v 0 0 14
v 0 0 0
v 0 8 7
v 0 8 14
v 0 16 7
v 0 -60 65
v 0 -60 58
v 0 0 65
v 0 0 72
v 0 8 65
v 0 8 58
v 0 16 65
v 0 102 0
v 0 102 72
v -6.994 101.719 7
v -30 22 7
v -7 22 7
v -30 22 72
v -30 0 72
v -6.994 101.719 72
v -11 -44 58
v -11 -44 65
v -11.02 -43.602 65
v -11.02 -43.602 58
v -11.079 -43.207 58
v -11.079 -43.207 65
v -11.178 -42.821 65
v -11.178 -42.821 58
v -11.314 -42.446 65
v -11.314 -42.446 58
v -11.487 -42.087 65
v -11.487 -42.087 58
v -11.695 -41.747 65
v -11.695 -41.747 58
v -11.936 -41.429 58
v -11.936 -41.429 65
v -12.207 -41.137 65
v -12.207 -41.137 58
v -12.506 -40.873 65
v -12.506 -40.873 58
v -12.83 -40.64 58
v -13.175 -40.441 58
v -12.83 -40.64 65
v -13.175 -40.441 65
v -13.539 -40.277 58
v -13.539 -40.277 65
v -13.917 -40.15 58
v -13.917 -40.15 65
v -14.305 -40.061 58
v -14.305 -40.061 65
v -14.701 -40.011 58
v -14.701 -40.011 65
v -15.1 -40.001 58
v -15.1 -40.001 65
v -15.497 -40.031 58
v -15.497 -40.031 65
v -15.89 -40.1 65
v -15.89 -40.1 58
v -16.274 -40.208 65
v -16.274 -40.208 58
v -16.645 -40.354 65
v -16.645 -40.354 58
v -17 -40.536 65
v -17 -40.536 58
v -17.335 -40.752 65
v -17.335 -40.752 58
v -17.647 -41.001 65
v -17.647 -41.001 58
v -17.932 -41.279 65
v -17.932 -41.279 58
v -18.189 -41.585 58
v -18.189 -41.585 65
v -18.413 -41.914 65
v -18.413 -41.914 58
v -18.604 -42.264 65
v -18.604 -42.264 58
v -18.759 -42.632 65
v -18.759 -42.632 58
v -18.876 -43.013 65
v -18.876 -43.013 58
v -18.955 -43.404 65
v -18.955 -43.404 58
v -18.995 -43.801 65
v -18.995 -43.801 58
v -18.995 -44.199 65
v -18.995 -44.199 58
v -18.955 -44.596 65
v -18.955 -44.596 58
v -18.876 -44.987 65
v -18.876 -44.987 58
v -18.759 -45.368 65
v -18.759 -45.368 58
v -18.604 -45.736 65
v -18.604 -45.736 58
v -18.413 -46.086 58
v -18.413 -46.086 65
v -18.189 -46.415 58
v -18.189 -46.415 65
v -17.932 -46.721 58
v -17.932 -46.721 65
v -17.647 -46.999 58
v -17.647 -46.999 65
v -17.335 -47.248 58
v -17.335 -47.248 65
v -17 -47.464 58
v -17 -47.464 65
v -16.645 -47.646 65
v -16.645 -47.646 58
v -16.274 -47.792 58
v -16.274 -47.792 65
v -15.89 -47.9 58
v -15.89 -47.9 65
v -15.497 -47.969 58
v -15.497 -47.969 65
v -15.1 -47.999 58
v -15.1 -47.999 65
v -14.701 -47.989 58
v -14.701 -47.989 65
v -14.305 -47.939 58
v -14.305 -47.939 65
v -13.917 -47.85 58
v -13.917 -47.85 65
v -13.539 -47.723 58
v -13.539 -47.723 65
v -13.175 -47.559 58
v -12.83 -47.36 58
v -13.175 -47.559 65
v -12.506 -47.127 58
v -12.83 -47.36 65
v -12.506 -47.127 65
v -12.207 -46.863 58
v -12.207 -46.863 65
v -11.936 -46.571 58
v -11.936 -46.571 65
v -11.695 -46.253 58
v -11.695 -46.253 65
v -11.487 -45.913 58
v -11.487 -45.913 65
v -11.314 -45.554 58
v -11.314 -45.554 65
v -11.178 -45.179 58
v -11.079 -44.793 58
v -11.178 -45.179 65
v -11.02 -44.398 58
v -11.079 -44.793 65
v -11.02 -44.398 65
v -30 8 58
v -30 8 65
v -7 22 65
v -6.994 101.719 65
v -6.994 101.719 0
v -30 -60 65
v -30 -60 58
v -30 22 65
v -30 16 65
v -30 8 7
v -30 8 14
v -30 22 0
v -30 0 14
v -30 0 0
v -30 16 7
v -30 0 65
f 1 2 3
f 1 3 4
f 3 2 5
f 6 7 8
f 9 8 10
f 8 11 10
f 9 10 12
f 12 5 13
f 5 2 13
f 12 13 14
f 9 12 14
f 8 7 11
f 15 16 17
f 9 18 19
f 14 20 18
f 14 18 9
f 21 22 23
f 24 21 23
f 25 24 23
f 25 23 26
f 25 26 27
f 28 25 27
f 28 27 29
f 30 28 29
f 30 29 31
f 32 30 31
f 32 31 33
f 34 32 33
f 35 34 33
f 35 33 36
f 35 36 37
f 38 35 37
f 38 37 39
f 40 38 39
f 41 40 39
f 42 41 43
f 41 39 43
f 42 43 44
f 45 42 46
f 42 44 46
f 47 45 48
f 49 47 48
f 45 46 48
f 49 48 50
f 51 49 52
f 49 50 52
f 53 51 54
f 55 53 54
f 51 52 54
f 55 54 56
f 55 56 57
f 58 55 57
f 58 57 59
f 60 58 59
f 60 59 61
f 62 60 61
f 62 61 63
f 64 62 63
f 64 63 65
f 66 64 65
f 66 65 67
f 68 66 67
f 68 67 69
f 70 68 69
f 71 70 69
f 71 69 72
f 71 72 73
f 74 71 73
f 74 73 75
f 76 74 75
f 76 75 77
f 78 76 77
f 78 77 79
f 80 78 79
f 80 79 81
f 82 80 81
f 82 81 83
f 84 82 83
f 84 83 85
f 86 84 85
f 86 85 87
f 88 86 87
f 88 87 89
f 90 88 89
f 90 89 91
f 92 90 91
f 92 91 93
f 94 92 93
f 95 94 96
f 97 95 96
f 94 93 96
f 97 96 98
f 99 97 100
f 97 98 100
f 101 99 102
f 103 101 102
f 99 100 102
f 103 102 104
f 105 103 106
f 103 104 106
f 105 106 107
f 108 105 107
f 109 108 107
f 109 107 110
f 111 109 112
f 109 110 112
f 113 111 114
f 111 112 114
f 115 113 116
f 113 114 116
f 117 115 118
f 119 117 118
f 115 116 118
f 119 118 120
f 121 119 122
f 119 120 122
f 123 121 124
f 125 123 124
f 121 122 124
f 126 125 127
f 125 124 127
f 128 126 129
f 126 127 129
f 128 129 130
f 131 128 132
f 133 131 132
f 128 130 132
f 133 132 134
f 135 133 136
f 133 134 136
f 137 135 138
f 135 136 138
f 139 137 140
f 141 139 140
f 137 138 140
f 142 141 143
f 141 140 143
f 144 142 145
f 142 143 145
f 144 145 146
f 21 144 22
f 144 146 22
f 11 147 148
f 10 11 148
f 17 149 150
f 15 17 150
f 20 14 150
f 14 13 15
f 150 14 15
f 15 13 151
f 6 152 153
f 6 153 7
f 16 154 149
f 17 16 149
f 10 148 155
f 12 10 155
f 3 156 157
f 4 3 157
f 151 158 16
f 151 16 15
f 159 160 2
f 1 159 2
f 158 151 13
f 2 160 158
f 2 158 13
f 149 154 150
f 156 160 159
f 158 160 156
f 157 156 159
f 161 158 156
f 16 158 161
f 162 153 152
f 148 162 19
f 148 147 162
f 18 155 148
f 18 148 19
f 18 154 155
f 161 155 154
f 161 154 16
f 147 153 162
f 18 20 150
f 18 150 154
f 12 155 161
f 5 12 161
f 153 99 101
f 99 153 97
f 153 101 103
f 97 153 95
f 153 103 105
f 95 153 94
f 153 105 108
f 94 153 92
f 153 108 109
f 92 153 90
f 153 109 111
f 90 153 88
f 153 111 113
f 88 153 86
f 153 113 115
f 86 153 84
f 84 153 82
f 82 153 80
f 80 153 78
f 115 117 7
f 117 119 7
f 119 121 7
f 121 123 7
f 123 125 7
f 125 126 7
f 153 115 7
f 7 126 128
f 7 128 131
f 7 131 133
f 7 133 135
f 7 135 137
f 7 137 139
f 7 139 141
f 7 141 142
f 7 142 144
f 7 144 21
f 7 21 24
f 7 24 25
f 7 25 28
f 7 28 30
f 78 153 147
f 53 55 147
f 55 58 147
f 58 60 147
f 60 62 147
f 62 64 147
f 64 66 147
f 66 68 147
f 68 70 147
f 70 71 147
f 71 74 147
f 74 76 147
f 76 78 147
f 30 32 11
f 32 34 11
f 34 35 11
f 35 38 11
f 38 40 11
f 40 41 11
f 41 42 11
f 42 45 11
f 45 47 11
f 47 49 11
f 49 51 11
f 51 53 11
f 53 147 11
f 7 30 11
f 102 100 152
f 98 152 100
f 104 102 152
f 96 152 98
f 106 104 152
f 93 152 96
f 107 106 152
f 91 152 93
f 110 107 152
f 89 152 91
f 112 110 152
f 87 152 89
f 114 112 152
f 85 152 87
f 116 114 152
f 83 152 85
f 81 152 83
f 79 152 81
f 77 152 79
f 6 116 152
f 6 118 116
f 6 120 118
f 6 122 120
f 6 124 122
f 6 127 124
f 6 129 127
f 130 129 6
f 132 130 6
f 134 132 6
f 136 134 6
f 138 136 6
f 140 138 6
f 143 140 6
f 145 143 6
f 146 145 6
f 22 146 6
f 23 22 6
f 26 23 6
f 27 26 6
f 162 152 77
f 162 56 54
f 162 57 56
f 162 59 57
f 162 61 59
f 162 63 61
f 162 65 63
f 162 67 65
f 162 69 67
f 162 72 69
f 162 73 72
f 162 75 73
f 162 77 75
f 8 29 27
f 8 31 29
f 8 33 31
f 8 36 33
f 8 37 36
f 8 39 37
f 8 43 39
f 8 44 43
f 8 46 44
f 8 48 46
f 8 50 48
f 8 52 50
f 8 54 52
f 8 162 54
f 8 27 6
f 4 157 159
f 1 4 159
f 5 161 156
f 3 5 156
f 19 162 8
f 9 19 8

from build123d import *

# Parameters (mm, degrees)
F0_W      = 30
F0_H      = 22
F1_DEPTH  = 72
F3_DEPTH  = 72.001
F4_DEPTH  = 7
F6_DEPTH  = 7
F7_W      = 8
F7_H      = 44
F8_DEPTH  = 30.001
F9_W      = 30
F9_H      = 7
F10_DEPTH = 60
F11_R     = 4
F12_DEPTH = 65.001


with BuildPart() as f1:
    # F0 (on Top) → F1 (new body)
    with BuildSketch(Plane.XY):
        with Locations((-15, 11)):
            Rectangle(F0_W, F0_H)
        Polygon((-6.99437, 101.719299), (-30, 22), (0, 22), (0, 102), align=None)
    extrude(amount=F1_DEPTH)

    # F2 (on face) → F3 (cut, through all)
    with BuildSketch(Plane.XY.offset(72)):
        Polygon((-6.99437, 101.719299), (-30, 22), (-7, 22), align=None)
    extrude(amount=-F3_DEPTH, mode=Mode.SUBTRACT)

    # F2 (on face) → F4 (join)
    with BuildSketch(Plane.XY.offset(72)):
        Polygon((-6.99437, 101.719299), (-30, 22), (-7, 22), align=None)
    extrude(amount=-F4_DEPTH)

    # F5 (on face) → F6 (join)
    with BuildSketch(Plane(origin=(0, 0, 0), x_dir=(1, 0, 0), z_dir=(0, 0, -1))):
        Polygon((-6.99437, -101.719299), (-7, -22), (-30, -22), align=None)
    extrude(amount=-F6_DEPTH)

    # F7 (on face) → F8 (cut, through all)
    with BuildSketch(Plane(origin=(-30, 0, 0), x_dir=(0, -1, 0), z_dir=(-1, 0, 0))):
        Polygon((-8, 65), (-16, 65), (-16, 7), (-8, 7), (-8, 14), (-8, 58), align=None)
        with Locations((-4, 36)):
            Rectangle(F7_W, F7_H)
    extrude(amount=-F8_DEPTH, mode=Mode.SUBTRACT)

    # F9 (on face) → F10 (join)
    with BuildSketch(Plane.XZ):
        with Locations((-15, 61.5)):
            Rectangle(F9_W, F9_H)
    extrude(amount=F10_DEPTH)

    # F11 (on face) → F12 (cut, through all)
    with BuildSketch(Plane.XY.offset(65)):
        with Locations((-15, -44)):
            Circle(F11_R)
    extrude(amount=-F12_DEPTH, mode=Mode.SUBTRACT)


solid = f1.part
